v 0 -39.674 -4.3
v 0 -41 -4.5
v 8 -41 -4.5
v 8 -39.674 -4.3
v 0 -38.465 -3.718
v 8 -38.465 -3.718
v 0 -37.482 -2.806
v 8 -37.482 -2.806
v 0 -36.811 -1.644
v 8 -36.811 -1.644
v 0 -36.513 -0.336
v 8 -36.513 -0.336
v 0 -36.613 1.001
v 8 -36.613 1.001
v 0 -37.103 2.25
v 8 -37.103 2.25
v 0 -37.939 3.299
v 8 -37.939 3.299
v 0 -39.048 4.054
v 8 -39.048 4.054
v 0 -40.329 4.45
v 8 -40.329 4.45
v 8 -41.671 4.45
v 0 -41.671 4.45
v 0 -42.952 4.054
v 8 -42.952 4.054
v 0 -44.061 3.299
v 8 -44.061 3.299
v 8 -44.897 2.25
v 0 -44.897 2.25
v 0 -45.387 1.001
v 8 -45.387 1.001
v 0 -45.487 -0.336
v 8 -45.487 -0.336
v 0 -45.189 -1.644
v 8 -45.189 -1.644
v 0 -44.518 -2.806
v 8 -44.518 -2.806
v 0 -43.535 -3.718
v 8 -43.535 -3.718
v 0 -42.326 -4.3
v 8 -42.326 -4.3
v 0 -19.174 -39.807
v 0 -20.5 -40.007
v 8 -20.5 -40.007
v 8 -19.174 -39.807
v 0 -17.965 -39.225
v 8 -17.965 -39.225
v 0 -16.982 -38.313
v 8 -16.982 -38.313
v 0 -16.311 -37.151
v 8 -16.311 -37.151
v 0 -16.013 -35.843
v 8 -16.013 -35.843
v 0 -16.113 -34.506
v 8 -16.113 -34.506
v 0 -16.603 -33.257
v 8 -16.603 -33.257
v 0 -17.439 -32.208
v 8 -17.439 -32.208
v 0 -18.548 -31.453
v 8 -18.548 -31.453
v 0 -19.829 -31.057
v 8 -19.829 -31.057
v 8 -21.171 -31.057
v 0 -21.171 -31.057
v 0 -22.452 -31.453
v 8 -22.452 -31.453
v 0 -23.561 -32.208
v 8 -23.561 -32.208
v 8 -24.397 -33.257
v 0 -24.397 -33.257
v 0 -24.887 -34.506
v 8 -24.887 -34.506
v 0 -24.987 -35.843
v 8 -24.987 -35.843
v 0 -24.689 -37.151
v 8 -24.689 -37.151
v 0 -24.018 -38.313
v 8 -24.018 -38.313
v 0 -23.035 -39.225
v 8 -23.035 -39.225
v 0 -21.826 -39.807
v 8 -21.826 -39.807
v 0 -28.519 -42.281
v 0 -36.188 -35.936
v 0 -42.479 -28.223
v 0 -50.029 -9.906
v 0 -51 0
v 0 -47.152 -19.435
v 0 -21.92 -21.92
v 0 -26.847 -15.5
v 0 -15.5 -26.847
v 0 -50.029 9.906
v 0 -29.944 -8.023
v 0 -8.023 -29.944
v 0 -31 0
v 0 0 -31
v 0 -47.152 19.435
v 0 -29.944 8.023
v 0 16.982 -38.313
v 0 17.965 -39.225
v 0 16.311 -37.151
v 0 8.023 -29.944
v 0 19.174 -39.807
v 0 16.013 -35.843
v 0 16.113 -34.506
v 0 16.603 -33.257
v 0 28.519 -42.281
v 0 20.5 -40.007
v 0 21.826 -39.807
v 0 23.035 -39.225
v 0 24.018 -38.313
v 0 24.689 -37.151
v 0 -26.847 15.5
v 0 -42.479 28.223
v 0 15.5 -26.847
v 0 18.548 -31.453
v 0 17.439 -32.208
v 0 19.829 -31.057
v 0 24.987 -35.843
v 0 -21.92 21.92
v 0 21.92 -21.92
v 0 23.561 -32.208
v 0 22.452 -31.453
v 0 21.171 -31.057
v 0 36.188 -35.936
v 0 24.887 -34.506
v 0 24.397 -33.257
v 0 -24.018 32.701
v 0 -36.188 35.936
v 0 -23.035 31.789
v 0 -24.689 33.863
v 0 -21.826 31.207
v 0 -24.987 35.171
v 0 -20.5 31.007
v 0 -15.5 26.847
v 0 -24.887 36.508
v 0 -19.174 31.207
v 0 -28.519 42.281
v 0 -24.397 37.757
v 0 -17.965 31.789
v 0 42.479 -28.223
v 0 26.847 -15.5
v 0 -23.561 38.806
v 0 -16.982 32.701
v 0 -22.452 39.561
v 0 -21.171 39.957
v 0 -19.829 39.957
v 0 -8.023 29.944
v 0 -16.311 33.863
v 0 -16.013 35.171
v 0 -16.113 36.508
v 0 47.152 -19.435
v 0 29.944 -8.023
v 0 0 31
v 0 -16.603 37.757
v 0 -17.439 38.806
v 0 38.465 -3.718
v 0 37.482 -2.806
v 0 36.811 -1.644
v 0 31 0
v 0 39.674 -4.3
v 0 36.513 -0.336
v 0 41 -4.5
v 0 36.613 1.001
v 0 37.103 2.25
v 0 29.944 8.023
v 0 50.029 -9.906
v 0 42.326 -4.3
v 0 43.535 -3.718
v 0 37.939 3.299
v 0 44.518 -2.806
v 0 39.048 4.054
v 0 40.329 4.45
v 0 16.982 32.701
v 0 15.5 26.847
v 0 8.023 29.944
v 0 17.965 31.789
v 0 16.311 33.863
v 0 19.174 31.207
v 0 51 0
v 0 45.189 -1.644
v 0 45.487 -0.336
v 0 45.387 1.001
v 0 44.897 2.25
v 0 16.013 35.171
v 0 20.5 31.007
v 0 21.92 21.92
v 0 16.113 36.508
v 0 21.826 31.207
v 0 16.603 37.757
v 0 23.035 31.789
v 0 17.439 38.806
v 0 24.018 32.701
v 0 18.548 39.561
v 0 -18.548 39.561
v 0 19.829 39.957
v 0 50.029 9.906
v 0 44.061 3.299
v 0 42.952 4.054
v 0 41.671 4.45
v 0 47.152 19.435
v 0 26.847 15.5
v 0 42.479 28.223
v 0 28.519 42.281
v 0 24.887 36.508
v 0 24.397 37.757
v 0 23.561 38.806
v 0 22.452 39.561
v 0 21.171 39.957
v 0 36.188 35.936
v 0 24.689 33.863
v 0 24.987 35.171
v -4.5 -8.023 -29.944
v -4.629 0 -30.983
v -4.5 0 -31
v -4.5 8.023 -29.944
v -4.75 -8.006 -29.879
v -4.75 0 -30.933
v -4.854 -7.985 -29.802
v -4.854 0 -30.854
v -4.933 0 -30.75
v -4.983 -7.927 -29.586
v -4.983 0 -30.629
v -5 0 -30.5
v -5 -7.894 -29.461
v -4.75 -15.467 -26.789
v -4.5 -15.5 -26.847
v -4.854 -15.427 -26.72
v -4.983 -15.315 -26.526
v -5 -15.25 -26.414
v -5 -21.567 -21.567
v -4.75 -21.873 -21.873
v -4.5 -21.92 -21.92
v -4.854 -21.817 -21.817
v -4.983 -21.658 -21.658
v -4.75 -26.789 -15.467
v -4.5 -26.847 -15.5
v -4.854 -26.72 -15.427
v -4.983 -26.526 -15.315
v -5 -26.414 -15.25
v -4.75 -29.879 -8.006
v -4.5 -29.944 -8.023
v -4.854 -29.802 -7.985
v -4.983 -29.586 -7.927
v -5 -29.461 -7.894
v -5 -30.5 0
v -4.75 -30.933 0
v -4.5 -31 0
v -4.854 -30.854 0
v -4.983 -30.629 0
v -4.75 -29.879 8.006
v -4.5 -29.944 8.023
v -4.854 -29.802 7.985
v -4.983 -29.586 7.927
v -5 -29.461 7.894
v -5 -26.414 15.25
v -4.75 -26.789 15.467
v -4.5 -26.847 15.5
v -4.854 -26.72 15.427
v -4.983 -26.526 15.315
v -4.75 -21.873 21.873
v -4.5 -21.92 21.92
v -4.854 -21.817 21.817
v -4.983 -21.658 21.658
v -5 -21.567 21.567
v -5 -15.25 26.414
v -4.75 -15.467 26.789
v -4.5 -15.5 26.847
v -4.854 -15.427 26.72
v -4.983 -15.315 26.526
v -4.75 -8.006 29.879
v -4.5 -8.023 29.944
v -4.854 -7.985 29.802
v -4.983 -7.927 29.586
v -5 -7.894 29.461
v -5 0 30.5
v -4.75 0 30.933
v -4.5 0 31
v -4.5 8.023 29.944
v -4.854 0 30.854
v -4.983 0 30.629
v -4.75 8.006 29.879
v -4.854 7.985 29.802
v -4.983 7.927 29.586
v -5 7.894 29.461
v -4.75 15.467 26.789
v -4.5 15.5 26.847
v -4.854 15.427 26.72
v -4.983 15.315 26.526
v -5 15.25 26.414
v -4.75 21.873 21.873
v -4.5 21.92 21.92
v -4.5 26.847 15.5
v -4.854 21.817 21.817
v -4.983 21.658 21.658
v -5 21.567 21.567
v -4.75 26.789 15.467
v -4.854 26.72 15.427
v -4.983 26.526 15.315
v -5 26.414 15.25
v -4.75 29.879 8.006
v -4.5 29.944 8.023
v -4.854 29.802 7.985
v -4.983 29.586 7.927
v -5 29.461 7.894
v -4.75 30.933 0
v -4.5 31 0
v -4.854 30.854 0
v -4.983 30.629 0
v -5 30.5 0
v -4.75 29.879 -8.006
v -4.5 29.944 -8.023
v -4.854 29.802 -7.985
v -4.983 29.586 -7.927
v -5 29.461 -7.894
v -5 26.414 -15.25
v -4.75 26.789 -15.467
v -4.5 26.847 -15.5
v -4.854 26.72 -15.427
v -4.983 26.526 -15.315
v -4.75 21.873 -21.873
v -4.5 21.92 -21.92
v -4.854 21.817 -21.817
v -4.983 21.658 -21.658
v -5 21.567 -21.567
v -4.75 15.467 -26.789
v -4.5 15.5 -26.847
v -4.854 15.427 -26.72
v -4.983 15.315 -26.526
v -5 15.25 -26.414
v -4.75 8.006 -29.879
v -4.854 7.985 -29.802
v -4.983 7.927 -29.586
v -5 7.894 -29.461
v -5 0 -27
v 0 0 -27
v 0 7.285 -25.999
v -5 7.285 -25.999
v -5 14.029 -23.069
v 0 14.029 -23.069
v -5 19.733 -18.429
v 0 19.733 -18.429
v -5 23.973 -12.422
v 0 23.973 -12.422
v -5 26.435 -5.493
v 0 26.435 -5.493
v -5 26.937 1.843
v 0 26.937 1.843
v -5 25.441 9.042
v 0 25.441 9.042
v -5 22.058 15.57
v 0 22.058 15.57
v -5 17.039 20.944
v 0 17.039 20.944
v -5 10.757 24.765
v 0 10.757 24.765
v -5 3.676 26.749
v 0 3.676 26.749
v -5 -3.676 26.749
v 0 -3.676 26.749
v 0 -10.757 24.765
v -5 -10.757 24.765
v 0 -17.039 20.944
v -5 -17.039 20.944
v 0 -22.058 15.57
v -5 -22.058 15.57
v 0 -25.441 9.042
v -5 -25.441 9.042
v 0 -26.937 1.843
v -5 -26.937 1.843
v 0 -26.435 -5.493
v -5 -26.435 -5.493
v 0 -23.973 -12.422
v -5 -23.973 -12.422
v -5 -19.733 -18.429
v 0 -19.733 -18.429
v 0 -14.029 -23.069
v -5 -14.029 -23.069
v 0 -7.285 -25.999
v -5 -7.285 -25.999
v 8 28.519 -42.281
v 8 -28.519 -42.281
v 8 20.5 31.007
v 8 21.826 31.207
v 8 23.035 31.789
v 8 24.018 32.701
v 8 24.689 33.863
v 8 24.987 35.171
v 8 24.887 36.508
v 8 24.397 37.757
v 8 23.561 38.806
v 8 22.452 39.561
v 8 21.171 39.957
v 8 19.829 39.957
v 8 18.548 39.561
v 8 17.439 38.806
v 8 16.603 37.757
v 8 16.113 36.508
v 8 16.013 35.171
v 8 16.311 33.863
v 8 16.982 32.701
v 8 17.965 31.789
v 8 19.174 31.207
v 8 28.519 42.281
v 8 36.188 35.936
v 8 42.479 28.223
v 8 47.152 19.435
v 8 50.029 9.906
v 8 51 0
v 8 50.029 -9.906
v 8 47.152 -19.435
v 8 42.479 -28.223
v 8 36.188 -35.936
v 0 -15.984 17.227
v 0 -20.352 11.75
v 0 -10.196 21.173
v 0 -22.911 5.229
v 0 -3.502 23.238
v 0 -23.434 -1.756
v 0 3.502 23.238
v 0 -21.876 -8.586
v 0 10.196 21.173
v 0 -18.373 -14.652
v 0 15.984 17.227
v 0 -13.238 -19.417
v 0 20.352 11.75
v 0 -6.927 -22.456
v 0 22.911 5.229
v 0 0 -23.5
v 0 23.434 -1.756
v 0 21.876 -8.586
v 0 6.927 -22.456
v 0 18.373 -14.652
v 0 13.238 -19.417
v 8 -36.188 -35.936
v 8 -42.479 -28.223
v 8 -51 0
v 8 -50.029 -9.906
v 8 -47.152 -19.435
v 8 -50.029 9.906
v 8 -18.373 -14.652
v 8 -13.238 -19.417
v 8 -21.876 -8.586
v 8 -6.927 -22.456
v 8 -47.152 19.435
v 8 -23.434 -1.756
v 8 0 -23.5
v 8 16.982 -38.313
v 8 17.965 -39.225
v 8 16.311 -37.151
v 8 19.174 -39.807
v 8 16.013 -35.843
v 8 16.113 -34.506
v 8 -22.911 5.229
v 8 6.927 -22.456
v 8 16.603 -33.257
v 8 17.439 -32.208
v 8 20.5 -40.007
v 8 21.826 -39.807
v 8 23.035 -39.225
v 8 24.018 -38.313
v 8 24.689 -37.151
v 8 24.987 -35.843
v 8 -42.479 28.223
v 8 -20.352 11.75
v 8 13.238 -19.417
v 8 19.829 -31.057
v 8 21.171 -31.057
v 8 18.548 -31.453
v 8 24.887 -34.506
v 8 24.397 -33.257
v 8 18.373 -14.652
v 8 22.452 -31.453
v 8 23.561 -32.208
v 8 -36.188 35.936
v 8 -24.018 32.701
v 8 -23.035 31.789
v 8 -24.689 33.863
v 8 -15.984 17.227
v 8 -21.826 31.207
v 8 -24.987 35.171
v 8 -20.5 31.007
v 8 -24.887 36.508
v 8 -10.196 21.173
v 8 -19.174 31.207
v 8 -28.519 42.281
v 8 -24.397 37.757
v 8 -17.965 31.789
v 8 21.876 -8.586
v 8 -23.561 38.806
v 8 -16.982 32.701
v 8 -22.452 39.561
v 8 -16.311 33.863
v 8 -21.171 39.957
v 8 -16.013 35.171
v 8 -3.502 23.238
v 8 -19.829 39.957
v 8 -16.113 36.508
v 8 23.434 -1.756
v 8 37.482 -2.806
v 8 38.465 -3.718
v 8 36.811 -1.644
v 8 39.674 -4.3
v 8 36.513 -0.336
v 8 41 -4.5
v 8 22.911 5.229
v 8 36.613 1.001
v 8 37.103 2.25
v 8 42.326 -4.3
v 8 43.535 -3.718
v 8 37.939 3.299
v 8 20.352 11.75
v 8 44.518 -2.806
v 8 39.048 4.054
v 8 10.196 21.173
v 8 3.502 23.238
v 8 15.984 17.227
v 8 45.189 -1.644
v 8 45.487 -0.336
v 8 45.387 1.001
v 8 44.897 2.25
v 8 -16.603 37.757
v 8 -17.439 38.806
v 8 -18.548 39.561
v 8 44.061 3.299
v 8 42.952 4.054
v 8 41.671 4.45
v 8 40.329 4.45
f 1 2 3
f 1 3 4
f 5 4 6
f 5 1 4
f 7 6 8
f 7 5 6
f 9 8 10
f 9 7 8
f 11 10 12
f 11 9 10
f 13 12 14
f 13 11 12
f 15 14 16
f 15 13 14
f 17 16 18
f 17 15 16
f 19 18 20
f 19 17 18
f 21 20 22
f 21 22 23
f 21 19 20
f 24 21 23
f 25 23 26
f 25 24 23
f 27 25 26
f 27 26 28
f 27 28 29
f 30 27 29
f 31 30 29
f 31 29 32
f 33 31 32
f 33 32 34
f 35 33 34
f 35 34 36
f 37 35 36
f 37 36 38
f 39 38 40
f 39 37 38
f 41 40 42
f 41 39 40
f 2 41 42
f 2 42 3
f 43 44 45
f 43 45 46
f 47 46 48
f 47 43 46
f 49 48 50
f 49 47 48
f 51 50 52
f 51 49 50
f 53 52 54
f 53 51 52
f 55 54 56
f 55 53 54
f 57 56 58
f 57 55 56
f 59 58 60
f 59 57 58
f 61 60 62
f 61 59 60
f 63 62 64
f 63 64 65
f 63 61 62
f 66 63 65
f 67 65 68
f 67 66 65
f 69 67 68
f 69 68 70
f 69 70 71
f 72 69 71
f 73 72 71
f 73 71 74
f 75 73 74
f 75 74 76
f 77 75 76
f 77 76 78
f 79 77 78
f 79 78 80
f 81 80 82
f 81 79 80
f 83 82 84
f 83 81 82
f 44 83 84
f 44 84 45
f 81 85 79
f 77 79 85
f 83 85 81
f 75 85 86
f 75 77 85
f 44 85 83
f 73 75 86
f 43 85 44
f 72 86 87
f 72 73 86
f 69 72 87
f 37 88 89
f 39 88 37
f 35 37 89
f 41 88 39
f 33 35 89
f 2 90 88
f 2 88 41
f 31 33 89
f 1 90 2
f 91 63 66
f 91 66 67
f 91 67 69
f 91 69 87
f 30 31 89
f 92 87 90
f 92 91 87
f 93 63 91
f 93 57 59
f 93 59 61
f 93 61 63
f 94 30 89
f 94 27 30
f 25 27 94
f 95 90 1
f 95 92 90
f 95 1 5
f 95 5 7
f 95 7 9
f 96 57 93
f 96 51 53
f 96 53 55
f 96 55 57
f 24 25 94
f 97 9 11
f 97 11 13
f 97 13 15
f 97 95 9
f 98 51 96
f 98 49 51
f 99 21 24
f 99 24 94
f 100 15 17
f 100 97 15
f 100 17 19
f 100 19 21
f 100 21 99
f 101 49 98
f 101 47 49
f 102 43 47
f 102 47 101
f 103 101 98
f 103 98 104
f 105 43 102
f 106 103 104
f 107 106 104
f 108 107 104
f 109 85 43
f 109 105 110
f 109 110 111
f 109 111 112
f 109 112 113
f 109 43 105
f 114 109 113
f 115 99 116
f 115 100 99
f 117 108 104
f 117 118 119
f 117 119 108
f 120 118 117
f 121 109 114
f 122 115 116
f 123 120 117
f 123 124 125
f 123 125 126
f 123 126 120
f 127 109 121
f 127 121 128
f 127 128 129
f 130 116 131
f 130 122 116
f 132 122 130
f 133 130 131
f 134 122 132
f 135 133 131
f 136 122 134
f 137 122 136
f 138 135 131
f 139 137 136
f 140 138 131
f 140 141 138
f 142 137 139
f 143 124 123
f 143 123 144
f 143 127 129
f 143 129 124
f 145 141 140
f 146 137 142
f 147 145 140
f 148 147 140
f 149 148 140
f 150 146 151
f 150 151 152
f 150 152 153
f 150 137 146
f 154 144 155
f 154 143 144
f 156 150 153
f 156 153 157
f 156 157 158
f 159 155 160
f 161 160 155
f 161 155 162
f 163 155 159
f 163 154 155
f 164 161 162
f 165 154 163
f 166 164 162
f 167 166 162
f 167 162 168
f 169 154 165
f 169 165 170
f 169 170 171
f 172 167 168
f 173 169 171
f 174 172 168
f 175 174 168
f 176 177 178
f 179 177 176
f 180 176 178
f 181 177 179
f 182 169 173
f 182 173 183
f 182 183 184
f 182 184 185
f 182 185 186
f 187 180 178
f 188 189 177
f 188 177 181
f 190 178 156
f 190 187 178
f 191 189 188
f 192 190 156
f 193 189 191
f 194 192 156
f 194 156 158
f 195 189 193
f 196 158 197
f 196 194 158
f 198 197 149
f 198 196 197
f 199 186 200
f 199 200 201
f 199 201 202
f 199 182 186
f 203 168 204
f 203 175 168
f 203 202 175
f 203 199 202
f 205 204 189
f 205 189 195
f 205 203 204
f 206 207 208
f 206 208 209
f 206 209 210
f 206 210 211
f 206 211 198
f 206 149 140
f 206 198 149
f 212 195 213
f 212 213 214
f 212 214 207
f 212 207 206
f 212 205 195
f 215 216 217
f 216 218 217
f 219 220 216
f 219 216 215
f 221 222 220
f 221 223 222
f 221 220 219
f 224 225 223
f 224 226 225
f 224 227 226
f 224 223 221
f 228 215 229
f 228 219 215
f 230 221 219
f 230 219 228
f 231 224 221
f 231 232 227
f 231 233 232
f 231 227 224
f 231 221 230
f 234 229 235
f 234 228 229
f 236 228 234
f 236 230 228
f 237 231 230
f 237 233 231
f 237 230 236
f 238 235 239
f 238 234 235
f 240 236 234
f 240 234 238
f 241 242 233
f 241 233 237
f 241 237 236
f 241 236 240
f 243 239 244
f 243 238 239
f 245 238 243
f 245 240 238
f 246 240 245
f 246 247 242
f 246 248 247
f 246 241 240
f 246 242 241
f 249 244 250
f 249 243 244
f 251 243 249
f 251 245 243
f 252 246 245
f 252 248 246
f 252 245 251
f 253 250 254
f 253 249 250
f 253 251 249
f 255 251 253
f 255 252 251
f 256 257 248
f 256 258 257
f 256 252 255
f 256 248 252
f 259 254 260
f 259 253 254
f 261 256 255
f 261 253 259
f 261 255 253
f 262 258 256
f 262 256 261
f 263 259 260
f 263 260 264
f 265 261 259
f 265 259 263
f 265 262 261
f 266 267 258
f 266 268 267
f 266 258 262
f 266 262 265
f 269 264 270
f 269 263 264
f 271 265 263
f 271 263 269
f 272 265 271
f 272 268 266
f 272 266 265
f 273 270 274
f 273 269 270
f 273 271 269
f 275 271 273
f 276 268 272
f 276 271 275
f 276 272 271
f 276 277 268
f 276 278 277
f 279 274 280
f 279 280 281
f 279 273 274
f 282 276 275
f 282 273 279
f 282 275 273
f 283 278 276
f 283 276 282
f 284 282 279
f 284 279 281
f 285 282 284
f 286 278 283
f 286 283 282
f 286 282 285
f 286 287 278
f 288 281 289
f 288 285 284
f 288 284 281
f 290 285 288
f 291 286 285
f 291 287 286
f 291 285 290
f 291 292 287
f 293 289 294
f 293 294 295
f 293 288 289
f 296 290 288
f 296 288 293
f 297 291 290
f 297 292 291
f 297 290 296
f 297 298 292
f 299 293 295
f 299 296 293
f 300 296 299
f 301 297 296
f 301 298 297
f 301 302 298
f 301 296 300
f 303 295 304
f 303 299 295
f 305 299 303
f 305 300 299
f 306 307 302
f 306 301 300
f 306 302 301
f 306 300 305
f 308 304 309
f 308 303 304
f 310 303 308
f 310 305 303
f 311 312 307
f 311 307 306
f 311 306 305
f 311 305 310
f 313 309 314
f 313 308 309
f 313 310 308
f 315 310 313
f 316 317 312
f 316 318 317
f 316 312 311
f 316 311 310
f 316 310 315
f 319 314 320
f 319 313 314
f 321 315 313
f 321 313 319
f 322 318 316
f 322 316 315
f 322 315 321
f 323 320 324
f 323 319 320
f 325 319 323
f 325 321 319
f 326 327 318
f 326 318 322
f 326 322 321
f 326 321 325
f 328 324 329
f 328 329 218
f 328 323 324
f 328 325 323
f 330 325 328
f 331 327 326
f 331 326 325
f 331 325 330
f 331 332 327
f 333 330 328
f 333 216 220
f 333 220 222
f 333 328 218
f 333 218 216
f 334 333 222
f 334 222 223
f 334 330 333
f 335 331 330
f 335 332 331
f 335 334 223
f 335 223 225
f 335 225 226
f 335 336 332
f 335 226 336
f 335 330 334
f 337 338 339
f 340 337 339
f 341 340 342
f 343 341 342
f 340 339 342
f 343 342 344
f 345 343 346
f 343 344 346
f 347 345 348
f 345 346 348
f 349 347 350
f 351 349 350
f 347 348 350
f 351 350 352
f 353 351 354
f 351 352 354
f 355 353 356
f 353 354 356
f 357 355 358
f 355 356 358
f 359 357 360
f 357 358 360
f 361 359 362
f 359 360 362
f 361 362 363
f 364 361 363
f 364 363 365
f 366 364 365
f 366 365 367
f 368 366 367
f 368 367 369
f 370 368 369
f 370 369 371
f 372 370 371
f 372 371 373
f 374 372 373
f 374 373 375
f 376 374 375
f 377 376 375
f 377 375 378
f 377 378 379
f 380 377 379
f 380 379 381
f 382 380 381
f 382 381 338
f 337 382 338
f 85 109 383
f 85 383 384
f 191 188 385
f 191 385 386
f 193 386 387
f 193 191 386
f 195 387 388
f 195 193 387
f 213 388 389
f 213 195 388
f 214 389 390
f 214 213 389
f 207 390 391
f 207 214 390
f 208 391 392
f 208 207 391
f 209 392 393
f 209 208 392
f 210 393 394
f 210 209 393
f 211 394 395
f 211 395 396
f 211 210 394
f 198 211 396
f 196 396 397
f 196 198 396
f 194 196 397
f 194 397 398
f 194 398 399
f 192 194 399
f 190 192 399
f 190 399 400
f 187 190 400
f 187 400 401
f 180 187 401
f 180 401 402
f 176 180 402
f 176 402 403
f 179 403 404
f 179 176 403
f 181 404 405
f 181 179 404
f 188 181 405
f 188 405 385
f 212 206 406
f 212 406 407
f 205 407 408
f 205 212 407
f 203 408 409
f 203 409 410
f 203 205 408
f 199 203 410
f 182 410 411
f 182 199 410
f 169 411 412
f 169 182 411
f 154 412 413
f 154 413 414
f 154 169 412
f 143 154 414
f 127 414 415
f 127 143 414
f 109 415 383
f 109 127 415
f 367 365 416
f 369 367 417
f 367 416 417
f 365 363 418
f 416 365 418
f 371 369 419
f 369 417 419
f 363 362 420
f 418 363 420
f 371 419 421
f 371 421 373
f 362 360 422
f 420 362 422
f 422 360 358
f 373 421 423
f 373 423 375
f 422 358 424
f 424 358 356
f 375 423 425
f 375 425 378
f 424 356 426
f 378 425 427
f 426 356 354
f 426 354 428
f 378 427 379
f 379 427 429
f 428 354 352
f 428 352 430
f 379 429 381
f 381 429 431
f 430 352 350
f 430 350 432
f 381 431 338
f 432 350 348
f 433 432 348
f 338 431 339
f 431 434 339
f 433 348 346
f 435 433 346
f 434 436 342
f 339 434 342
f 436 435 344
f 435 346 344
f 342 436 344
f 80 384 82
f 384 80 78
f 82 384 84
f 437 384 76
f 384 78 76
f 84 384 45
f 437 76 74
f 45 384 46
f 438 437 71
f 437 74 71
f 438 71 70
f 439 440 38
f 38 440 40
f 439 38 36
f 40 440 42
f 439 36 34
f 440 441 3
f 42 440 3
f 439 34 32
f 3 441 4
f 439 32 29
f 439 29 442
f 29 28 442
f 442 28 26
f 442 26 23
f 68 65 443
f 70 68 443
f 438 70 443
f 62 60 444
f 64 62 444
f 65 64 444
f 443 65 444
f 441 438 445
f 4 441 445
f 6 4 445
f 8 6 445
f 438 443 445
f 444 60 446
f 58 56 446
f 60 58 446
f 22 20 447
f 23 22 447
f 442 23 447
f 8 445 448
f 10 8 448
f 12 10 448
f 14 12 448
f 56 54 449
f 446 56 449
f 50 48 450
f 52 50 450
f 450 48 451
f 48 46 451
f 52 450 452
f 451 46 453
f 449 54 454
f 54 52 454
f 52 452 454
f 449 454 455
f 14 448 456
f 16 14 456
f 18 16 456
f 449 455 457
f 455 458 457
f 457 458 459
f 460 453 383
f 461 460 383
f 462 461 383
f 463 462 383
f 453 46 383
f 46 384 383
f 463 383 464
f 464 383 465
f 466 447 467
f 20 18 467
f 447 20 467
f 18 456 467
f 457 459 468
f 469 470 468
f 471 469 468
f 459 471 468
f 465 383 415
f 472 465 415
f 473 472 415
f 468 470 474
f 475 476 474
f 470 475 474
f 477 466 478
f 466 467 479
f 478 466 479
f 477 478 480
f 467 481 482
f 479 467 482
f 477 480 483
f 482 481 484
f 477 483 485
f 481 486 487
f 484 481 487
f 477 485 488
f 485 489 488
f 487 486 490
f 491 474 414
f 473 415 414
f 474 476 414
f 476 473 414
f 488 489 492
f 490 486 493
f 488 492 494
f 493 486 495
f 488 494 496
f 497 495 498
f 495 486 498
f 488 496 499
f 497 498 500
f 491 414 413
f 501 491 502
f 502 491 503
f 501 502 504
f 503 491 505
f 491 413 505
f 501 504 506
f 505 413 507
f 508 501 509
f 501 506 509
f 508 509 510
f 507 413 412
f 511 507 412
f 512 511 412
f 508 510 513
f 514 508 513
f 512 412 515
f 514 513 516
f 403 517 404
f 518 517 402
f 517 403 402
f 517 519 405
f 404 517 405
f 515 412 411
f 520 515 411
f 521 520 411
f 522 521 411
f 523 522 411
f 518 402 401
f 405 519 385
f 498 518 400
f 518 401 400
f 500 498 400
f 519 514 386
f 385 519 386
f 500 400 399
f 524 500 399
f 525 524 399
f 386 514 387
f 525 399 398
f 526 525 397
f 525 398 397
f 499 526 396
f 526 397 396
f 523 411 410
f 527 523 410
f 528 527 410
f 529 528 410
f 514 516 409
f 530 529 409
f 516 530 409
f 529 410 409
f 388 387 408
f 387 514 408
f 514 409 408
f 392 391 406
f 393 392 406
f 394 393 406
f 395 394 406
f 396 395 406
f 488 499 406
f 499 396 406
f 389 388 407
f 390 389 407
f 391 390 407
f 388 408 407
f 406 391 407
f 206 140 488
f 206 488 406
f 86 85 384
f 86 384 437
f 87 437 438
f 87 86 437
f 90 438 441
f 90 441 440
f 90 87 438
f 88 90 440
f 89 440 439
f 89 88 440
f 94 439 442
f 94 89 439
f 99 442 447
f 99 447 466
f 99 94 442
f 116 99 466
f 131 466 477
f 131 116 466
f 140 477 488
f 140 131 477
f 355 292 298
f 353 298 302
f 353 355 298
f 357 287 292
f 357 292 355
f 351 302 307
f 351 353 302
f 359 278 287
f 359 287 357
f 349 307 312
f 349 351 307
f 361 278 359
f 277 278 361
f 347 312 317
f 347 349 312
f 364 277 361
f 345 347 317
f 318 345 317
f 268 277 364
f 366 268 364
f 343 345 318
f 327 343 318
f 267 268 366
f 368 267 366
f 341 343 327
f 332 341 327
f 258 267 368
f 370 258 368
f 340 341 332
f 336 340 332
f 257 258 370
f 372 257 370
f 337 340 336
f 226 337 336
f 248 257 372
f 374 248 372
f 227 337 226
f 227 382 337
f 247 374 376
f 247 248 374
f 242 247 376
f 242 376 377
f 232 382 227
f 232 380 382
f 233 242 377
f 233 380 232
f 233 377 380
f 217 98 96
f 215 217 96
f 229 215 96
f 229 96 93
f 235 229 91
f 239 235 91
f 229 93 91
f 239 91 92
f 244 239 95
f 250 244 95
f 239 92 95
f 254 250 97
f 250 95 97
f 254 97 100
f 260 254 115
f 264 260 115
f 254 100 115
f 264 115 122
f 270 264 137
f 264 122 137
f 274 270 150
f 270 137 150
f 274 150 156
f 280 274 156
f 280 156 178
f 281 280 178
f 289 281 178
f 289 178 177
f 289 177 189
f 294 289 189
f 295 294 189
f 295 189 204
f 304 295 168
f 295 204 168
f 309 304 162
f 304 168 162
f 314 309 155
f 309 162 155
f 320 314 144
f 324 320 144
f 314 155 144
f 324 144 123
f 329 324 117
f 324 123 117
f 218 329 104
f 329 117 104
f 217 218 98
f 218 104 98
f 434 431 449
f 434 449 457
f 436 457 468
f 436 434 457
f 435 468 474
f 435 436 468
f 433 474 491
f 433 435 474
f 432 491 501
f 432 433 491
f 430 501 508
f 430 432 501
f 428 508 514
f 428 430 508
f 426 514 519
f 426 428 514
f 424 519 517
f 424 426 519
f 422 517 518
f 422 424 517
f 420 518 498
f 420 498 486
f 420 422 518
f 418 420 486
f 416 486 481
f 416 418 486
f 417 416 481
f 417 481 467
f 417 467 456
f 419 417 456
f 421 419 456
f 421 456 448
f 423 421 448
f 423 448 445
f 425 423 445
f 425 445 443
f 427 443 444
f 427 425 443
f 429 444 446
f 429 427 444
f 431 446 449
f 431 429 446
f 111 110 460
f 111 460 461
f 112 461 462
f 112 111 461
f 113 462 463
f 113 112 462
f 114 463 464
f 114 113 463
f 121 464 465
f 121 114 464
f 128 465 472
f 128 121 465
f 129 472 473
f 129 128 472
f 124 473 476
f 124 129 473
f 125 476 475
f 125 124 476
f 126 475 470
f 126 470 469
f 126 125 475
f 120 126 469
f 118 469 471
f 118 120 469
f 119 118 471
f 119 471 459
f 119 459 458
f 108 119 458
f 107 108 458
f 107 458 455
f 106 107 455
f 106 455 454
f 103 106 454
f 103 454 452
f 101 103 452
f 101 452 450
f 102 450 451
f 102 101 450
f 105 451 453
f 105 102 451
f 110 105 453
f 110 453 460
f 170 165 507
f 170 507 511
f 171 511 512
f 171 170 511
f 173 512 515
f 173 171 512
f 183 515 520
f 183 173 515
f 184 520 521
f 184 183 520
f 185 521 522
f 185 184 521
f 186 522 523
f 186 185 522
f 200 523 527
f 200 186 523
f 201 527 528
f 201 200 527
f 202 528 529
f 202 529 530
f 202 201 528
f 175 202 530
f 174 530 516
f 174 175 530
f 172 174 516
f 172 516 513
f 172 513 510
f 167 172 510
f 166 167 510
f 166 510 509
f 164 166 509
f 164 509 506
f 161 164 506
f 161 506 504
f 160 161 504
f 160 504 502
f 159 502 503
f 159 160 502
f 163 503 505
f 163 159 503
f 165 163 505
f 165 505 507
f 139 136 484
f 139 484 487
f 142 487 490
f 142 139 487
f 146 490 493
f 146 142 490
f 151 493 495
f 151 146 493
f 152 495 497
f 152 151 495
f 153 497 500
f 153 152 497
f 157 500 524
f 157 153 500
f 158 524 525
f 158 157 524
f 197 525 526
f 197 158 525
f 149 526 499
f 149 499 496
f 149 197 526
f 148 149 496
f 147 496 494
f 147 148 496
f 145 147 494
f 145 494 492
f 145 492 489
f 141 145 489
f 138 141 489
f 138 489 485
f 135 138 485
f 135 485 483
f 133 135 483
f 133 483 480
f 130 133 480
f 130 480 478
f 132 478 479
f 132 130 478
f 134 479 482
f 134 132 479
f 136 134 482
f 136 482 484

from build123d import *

# Parameters (mm, degrees)
SKETCH_1_R          = 23.5
SKETCH_1_R_2        = 4.5
EXTRUDE_1_DEPTH     = 8
SKETCH_2_R          = 31
EXTRUDE_2_DEPTH     = 5
FILLET_1_R          = 0.5
SKETCH_3_R          = 27
CUT_EXTRUDE_1_DEPTH = 67.728373836


with BuildPart() as part:
    # 草图1 → 凸台-拉伸1 (new body)
    with BuildSketch(Plane(origin=(0, 0, 0), x_dir=(0, 0, -1), z_dir=(1, 0, 0))):
        with BuildLine():
            Line((42.2809162, 28.518838077), (42.2809162, -28.518838077))
            ThreePointArc((42.2809162, -28.518838077), (0, -51), (-42.2809162, -28.518838077))
            Line((-42.2809162, -28.518838077), (-42.2809162, 28.518838077))
            ThreePointArc((-42.2809162, 28.518838077), (0, 51), (42.2809162, 28.518838077))
        make_face()
        Circle(SKETCH_1_R, mode=Mode.SUBTRACT)
        with Locations((0, 41)):
            Circle(SKETCH_1_R_2, mode=Mode.SUBTRACT)
        with Locations((35.507041555, 20.5)):
            Circle(SKETCH_1_R_2, mode=Mode.SUBTRACT)
        with Locations((35.507041555, -20.5)):
            Circle(SKETCH_1_R_2, mode=Mode.SUBTRACT)
        with Locations((0, -41)):
            Circle(SKETCH_1_R_2, mode=Mode.SUBTRACT)
        with Locations((-35.507041555, -20.5)):
            Circle(SKETCH_1_R_2, mode=Mode.SUBTRACT)
        with Locations((-35.507041555, 20.5)):
            Circle(SKETCH_1_R_2, mode=Mode.SUBTRACT)
    extrude(amount=EXTRUDE_1_DEPTH)

    # 草图2 → 凸台-拉伸2 (add)
    with BuildSketch(Plane.ZY):
        with Locations(Location((0, 0, 0), (0, 0, 180))):
            Circle(SKETCH_2_R)
    extrude(amount=EXTRUDE_2_DEPTH)

    # 圆角1
    fillet_1_edges = [part.edges().sort_by_distance(p)[0] for p in [
        (-5, 0, 31),
    ]]
    fillet(fillet_1_edges, radius=FILLET_1_R)

    # 草图3 → 切除-拉伸1 (cut, through all)
    with BuildSketch(Plane(origin=(0, 0, 0), x_dir=(0, 0, -1), z_dir=(1, 0, 0))):
        Circle(SKETCH_3_R)
    extrude(amount=-CUT_EXTRUDE_1_DEPTH, mode=Mode.SUBTRACT)


solid = part.part
